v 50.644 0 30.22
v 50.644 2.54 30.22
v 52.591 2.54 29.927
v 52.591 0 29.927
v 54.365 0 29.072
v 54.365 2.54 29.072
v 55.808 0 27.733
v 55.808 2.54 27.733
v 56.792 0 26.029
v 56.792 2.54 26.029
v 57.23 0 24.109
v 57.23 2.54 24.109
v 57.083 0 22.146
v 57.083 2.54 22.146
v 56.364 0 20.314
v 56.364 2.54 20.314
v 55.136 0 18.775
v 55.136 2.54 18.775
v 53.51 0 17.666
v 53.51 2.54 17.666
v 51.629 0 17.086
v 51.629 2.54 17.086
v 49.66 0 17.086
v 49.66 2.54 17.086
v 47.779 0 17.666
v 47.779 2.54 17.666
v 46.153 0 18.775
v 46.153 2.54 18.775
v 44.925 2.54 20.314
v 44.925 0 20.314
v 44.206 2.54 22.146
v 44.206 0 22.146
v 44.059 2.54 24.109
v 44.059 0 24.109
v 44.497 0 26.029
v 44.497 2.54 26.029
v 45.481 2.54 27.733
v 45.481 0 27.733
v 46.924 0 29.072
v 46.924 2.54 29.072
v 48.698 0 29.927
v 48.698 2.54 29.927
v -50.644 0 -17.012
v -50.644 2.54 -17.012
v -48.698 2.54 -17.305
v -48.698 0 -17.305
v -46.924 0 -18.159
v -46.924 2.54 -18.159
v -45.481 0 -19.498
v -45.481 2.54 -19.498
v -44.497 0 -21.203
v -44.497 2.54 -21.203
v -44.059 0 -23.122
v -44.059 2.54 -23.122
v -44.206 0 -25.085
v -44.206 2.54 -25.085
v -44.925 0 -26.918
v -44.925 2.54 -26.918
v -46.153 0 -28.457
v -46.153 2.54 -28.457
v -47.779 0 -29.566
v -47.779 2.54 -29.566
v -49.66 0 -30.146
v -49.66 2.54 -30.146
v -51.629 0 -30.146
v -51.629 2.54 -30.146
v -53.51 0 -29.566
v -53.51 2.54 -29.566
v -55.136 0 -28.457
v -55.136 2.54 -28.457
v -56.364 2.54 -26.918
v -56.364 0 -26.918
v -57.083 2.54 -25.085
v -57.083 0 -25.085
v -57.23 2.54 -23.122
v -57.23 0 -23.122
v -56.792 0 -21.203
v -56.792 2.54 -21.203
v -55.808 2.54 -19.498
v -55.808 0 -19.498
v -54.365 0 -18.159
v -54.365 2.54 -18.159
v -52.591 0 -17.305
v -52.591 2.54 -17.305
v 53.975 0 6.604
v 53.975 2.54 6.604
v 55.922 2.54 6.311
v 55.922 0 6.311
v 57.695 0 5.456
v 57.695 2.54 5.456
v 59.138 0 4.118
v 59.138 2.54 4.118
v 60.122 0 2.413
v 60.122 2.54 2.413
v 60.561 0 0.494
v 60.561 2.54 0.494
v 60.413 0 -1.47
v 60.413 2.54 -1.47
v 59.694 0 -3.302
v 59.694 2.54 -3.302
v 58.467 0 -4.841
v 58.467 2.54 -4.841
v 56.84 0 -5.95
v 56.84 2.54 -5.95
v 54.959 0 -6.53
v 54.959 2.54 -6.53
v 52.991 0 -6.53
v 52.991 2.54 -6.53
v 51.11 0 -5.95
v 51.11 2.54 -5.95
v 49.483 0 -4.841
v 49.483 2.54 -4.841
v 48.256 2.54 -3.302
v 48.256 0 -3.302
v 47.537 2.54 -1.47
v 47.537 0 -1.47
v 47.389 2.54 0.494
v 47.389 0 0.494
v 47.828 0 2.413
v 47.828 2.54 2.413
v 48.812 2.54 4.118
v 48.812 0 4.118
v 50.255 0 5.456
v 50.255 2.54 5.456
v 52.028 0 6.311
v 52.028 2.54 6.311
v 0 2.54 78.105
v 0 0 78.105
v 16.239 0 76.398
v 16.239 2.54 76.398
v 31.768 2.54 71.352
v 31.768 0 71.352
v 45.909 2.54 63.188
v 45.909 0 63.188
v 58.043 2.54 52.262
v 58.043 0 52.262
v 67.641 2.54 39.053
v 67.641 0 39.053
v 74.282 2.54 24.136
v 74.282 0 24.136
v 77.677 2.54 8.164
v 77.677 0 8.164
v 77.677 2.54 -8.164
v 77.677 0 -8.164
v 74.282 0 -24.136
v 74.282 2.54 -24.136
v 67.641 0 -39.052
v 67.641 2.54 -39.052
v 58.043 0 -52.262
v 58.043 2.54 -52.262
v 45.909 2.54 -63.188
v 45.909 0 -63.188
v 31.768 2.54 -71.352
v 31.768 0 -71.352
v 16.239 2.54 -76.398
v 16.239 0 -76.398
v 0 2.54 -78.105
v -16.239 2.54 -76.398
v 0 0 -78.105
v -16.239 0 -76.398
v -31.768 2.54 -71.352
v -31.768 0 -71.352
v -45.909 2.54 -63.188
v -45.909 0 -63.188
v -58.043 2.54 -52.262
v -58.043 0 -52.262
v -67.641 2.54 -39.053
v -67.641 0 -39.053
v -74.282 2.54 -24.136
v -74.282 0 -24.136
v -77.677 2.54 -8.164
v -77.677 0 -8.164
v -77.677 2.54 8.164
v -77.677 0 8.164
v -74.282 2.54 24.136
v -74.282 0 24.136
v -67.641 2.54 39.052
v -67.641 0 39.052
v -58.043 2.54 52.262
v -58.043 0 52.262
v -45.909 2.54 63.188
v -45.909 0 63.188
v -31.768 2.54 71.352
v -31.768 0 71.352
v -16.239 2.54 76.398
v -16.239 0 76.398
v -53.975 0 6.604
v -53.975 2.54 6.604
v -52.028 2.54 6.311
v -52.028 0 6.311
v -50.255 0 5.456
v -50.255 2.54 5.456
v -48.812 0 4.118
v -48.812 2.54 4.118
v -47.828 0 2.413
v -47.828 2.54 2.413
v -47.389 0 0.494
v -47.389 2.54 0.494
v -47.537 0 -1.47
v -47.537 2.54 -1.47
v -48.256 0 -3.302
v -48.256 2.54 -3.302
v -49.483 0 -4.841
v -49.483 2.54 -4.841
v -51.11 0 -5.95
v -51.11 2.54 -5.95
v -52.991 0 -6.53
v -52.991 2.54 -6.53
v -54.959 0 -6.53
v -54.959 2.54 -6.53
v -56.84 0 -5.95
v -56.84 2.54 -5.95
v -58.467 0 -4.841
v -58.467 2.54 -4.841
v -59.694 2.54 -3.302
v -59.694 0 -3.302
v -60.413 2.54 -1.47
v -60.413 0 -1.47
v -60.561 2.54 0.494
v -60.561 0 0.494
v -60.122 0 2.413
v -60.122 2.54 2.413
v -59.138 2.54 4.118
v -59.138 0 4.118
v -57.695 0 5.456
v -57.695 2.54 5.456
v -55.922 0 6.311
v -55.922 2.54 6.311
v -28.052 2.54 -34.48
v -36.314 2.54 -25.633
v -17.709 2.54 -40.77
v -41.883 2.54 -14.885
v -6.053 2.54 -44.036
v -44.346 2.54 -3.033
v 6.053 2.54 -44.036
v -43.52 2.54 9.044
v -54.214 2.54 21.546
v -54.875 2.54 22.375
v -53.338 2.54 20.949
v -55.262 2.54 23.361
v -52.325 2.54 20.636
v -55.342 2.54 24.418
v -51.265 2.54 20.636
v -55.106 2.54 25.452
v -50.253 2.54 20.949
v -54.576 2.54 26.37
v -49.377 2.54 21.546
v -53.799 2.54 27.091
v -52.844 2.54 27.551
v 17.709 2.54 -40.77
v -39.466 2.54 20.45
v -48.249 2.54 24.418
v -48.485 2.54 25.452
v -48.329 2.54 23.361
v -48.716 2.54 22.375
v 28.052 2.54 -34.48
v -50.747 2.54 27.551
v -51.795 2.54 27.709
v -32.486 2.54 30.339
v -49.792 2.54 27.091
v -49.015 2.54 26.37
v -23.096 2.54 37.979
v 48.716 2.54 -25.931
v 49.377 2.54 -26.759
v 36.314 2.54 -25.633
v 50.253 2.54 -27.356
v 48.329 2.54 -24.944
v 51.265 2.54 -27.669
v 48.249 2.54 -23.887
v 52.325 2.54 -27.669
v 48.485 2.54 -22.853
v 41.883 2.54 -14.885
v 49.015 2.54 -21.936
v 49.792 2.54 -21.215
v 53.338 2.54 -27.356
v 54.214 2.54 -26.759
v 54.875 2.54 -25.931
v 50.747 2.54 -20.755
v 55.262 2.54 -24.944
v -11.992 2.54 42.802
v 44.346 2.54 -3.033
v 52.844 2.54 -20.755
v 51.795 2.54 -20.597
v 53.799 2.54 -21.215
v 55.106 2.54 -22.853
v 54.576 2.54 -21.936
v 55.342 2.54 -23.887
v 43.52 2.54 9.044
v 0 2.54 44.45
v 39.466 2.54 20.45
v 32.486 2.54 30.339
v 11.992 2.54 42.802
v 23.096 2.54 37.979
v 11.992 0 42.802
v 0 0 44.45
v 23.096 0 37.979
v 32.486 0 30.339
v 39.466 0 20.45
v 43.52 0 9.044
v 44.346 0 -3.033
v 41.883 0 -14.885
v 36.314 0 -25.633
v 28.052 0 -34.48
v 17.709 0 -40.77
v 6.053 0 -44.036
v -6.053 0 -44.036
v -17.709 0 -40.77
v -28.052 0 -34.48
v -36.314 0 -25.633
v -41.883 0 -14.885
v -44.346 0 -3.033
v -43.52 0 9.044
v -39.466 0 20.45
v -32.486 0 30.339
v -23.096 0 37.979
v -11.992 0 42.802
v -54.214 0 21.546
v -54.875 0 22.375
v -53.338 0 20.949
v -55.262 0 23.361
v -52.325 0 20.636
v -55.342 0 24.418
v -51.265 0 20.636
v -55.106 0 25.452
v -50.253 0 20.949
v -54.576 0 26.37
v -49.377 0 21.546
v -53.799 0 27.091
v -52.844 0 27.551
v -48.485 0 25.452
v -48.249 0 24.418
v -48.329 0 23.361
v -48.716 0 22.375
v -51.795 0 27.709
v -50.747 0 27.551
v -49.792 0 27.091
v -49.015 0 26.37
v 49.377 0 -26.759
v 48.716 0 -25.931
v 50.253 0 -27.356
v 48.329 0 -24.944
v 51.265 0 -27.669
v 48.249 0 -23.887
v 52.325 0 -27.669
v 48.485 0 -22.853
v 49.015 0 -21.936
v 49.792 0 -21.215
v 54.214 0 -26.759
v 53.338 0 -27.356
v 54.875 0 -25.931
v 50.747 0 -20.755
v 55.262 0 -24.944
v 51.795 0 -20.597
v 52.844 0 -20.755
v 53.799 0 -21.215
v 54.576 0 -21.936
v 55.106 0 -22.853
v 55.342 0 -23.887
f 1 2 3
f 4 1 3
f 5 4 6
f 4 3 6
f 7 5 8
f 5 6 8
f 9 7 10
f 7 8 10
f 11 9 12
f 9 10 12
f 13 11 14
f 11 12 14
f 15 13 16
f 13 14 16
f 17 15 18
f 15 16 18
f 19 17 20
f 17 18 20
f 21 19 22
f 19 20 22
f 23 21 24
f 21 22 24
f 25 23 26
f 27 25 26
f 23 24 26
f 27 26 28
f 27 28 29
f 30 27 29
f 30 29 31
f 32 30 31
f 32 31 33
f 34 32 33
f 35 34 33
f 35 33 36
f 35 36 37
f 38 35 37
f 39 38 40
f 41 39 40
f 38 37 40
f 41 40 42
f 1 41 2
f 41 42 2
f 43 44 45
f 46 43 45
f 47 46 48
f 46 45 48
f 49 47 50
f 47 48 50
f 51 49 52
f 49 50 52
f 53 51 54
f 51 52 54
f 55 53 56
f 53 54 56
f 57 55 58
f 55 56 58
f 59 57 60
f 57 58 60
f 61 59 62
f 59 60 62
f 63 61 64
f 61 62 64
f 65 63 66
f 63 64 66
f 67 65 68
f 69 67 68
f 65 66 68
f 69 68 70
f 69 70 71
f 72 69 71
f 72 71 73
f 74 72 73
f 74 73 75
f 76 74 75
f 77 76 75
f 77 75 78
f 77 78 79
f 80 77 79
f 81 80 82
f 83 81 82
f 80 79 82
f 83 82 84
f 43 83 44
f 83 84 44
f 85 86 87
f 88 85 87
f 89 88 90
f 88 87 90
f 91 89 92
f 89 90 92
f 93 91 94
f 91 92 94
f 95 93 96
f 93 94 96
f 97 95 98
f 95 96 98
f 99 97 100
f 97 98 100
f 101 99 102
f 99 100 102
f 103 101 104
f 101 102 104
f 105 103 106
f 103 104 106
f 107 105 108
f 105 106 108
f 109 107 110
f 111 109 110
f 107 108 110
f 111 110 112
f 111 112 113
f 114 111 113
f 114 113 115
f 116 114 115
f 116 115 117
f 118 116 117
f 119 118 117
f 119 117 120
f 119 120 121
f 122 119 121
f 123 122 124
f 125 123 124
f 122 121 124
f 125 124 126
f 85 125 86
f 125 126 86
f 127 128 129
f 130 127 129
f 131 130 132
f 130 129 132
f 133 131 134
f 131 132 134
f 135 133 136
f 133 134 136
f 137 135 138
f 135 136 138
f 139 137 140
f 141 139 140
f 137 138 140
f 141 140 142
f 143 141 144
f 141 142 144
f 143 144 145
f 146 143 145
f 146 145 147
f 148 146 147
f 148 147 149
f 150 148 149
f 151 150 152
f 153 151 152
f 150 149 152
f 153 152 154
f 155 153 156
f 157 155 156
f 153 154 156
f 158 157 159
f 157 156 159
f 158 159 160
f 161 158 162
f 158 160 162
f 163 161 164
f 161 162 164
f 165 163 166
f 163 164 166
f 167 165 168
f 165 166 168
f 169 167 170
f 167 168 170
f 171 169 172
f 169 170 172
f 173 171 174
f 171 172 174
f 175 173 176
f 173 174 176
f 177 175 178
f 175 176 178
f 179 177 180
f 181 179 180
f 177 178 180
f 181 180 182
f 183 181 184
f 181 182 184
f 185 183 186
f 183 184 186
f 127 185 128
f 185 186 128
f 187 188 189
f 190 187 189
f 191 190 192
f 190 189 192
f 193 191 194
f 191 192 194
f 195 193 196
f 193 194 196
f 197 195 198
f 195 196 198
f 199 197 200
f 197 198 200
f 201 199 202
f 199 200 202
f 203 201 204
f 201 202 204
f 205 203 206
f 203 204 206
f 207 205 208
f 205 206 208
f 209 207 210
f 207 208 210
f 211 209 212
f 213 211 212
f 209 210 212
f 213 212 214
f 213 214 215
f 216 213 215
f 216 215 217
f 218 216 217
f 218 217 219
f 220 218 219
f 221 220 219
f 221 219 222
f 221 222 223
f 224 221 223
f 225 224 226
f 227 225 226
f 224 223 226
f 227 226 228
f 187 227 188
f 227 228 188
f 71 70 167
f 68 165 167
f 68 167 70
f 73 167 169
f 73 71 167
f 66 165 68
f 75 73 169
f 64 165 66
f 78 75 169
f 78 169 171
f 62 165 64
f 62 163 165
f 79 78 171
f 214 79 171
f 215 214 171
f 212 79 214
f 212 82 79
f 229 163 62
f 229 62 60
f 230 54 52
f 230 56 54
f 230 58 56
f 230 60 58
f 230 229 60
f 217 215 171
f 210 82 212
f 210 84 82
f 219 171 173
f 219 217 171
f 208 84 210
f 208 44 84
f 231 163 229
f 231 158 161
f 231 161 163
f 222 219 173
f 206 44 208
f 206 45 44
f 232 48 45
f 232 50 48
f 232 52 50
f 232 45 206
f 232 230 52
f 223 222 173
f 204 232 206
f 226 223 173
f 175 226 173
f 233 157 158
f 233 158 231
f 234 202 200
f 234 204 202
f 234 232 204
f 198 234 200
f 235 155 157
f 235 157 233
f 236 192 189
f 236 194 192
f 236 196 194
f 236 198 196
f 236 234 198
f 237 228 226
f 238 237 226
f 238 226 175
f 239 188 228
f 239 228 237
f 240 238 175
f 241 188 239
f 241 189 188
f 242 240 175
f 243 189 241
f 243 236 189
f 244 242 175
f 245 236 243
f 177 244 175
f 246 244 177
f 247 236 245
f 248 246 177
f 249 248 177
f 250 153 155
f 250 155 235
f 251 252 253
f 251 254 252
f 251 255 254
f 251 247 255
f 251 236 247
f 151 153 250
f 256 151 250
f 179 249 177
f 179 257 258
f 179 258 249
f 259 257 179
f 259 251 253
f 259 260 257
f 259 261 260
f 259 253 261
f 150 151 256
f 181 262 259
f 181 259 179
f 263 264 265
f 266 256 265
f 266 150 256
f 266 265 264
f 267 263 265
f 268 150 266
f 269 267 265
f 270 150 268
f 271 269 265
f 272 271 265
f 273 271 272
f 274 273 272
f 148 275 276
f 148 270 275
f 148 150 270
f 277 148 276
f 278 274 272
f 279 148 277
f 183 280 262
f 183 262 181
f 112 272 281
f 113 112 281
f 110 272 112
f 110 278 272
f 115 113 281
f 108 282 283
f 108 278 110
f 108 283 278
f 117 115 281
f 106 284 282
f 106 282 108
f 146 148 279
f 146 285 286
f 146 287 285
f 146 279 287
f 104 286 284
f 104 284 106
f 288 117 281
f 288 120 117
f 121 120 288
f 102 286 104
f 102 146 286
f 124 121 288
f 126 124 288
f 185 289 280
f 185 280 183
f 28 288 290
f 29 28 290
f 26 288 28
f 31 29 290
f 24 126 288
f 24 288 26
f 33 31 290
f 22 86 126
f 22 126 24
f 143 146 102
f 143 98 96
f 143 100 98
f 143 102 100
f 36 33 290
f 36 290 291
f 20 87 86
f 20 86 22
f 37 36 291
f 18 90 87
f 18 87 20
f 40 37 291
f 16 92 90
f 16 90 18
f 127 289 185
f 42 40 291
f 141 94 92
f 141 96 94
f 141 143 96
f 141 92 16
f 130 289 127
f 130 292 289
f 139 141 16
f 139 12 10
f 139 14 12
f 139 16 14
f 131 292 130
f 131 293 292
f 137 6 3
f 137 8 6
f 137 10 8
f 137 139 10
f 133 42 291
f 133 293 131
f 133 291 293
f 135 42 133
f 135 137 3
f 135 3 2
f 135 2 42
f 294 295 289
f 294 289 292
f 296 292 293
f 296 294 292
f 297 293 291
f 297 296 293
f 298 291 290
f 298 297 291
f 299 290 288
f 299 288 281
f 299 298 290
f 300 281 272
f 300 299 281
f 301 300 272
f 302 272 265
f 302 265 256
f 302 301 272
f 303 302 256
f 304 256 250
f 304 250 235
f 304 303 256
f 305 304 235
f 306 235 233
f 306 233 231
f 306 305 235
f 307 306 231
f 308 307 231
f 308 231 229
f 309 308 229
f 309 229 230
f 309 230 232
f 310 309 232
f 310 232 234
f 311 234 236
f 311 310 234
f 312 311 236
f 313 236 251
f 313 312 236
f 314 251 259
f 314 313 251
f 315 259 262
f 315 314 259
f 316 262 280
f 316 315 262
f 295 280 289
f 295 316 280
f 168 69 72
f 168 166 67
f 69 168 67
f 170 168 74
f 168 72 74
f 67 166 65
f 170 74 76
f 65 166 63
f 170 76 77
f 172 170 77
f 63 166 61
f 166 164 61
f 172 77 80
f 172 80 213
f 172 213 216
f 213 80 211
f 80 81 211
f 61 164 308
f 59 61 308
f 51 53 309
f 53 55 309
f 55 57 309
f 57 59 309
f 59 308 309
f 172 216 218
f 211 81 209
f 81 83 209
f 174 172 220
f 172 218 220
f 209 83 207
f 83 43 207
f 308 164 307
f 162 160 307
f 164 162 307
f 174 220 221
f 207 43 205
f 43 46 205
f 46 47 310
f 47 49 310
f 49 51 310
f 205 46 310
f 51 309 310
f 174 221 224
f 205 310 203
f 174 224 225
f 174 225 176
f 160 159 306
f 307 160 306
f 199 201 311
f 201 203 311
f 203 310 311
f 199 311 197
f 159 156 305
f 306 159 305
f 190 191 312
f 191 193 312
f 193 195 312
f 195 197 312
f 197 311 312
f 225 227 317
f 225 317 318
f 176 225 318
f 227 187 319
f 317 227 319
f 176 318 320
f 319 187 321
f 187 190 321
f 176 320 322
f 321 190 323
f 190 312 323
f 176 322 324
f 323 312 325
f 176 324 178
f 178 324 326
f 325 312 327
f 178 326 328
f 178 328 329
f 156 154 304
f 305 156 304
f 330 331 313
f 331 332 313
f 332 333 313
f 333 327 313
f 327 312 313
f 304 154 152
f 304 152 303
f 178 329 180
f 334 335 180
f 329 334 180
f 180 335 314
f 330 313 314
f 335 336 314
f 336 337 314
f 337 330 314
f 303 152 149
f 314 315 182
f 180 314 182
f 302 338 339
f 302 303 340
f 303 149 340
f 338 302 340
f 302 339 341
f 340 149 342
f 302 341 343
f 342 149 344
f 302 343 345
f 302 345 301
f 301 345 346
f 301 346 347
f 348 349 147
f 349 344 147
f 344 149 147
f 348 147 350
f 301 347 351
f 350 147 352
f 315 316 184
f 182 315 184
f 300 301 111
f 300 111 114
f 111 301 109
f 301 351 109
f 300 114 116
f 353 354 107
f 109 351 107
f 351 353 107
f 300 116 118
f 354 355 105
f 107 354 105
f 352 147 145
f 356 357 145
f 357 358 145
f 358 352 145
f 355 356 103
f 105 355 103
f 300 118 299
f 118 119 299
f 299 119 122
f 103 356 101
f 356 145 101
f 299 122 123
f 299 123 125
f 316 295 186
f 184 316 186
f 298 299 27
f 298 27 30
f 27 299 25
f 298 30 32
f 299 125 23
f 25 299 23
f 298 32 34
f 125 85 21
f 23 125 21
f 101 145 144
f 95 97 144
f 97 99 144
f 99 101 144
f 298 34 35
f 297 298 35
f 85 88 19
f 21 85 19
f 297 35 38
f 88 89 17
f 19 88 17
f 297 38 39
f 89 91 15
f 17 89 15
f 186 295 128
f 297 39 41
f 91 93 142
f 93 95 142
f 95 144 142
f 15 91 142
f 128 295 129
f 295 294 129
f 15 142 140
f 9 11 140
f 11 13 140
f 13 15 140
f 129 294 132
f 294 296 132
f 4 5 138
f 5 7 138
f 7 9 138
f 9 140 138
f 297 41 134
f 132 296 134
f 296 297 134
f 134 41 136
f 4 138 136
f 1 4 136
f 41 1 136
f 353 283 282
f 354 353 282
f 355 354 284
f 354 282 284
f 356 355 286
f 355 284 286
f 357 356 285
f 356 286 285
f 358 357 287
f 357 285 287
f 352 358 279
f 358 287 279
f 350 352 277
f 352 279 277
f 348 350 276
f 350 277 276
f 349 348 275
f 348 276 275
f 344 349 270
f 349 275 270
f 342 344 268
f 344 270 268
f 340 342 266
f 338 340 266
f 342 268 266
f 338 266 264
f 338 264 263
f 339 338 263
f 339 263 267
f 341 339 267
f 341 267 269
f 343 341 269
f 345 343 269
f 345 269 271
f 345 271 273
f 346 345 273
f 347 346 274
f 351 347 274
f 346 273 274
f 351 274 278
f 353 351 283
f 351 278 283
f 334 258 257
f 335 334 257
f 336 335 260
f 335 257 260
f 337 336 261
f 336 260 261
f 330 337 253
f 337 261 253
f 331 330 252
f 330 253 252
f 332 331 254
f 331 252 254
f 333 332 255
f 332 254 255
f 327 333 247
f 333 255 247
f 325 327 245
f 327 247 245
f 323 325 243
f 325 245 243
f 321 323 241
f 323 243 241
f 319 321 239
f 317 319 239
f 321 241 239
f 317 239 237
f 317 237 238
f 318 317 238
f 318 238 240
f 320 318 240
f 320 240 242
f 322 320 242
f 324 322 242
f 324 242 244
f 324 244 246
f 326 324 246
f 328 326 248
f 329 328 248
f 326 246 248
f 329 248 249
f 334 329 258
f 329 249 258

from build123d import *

# Parameters (mm, degrees)
SKETCH1_R           = 78.105
SKETCH1_R_2         = 44.45
BOSS_EXTRUDE1_DEPTH = 2.54
SKETCH2_R           = 6.604
SKETCH2_R_2         = 3.556
CUT_EXTRUDE1_DEPTH  = 2.54


with BuildPart() as part:
    # Sketch1 → Boss-Extrude1 (new body)
    with BuildSketch(Plane(origin=(0, 0, 0), x_dir=(1, 0, 0), z_dir=(0, 1, 0))):
        with Locations(Location((0, 0, 0), (0, 0, 270))):
            Circle(SKETCH1_R)
        with Locations(Location((0, 0, 0), (0, 0, 270))):
            Circle(SKETCH1_R_2, mode=Mode.SUBTRACT)
    extrude(amount=BOSS_EXTRUDE1_DEPTH)

    # Sketch2 → Cut-Extrude1 (cut)
    with BuildSketch(Plane(origin=(0, 2.54, 0), x_dir=(1, 0, 0), z_dir=(0, 1, 0))):
        with Locations(Location((-53.975, 0, 0), (0, 0, 270))):
            Circle(SKETCH2_R)
        with Locations(Location((53.975, 0, 0), (0, 0, 270))):
            Circle(SKETCH2_R)
        with Locations(Location((-51.795490029, -24.152633658, 0), (0, 0, 270))):
            Circle(SKETCH2_R_2)
        with Locations(Location((51.795490029, 24.152633658, 0), (0, 0, 270))):
            Circle(SKETCH2_R_2)
        with Locations(Location((50.64447914, -23.615908466, 0), (0, 0, 270))):
            Circle(SKETCH2_R)
        with Locations(Location((-50.64447914, 23.615908466, 0), (0, 0, 270))):
            Circle(SKETCH2_R)
    extrude(amount=-CUT_EXTRUDE1_DEPTH, mode=Mode.SUBTRACT)


solid = part.part
